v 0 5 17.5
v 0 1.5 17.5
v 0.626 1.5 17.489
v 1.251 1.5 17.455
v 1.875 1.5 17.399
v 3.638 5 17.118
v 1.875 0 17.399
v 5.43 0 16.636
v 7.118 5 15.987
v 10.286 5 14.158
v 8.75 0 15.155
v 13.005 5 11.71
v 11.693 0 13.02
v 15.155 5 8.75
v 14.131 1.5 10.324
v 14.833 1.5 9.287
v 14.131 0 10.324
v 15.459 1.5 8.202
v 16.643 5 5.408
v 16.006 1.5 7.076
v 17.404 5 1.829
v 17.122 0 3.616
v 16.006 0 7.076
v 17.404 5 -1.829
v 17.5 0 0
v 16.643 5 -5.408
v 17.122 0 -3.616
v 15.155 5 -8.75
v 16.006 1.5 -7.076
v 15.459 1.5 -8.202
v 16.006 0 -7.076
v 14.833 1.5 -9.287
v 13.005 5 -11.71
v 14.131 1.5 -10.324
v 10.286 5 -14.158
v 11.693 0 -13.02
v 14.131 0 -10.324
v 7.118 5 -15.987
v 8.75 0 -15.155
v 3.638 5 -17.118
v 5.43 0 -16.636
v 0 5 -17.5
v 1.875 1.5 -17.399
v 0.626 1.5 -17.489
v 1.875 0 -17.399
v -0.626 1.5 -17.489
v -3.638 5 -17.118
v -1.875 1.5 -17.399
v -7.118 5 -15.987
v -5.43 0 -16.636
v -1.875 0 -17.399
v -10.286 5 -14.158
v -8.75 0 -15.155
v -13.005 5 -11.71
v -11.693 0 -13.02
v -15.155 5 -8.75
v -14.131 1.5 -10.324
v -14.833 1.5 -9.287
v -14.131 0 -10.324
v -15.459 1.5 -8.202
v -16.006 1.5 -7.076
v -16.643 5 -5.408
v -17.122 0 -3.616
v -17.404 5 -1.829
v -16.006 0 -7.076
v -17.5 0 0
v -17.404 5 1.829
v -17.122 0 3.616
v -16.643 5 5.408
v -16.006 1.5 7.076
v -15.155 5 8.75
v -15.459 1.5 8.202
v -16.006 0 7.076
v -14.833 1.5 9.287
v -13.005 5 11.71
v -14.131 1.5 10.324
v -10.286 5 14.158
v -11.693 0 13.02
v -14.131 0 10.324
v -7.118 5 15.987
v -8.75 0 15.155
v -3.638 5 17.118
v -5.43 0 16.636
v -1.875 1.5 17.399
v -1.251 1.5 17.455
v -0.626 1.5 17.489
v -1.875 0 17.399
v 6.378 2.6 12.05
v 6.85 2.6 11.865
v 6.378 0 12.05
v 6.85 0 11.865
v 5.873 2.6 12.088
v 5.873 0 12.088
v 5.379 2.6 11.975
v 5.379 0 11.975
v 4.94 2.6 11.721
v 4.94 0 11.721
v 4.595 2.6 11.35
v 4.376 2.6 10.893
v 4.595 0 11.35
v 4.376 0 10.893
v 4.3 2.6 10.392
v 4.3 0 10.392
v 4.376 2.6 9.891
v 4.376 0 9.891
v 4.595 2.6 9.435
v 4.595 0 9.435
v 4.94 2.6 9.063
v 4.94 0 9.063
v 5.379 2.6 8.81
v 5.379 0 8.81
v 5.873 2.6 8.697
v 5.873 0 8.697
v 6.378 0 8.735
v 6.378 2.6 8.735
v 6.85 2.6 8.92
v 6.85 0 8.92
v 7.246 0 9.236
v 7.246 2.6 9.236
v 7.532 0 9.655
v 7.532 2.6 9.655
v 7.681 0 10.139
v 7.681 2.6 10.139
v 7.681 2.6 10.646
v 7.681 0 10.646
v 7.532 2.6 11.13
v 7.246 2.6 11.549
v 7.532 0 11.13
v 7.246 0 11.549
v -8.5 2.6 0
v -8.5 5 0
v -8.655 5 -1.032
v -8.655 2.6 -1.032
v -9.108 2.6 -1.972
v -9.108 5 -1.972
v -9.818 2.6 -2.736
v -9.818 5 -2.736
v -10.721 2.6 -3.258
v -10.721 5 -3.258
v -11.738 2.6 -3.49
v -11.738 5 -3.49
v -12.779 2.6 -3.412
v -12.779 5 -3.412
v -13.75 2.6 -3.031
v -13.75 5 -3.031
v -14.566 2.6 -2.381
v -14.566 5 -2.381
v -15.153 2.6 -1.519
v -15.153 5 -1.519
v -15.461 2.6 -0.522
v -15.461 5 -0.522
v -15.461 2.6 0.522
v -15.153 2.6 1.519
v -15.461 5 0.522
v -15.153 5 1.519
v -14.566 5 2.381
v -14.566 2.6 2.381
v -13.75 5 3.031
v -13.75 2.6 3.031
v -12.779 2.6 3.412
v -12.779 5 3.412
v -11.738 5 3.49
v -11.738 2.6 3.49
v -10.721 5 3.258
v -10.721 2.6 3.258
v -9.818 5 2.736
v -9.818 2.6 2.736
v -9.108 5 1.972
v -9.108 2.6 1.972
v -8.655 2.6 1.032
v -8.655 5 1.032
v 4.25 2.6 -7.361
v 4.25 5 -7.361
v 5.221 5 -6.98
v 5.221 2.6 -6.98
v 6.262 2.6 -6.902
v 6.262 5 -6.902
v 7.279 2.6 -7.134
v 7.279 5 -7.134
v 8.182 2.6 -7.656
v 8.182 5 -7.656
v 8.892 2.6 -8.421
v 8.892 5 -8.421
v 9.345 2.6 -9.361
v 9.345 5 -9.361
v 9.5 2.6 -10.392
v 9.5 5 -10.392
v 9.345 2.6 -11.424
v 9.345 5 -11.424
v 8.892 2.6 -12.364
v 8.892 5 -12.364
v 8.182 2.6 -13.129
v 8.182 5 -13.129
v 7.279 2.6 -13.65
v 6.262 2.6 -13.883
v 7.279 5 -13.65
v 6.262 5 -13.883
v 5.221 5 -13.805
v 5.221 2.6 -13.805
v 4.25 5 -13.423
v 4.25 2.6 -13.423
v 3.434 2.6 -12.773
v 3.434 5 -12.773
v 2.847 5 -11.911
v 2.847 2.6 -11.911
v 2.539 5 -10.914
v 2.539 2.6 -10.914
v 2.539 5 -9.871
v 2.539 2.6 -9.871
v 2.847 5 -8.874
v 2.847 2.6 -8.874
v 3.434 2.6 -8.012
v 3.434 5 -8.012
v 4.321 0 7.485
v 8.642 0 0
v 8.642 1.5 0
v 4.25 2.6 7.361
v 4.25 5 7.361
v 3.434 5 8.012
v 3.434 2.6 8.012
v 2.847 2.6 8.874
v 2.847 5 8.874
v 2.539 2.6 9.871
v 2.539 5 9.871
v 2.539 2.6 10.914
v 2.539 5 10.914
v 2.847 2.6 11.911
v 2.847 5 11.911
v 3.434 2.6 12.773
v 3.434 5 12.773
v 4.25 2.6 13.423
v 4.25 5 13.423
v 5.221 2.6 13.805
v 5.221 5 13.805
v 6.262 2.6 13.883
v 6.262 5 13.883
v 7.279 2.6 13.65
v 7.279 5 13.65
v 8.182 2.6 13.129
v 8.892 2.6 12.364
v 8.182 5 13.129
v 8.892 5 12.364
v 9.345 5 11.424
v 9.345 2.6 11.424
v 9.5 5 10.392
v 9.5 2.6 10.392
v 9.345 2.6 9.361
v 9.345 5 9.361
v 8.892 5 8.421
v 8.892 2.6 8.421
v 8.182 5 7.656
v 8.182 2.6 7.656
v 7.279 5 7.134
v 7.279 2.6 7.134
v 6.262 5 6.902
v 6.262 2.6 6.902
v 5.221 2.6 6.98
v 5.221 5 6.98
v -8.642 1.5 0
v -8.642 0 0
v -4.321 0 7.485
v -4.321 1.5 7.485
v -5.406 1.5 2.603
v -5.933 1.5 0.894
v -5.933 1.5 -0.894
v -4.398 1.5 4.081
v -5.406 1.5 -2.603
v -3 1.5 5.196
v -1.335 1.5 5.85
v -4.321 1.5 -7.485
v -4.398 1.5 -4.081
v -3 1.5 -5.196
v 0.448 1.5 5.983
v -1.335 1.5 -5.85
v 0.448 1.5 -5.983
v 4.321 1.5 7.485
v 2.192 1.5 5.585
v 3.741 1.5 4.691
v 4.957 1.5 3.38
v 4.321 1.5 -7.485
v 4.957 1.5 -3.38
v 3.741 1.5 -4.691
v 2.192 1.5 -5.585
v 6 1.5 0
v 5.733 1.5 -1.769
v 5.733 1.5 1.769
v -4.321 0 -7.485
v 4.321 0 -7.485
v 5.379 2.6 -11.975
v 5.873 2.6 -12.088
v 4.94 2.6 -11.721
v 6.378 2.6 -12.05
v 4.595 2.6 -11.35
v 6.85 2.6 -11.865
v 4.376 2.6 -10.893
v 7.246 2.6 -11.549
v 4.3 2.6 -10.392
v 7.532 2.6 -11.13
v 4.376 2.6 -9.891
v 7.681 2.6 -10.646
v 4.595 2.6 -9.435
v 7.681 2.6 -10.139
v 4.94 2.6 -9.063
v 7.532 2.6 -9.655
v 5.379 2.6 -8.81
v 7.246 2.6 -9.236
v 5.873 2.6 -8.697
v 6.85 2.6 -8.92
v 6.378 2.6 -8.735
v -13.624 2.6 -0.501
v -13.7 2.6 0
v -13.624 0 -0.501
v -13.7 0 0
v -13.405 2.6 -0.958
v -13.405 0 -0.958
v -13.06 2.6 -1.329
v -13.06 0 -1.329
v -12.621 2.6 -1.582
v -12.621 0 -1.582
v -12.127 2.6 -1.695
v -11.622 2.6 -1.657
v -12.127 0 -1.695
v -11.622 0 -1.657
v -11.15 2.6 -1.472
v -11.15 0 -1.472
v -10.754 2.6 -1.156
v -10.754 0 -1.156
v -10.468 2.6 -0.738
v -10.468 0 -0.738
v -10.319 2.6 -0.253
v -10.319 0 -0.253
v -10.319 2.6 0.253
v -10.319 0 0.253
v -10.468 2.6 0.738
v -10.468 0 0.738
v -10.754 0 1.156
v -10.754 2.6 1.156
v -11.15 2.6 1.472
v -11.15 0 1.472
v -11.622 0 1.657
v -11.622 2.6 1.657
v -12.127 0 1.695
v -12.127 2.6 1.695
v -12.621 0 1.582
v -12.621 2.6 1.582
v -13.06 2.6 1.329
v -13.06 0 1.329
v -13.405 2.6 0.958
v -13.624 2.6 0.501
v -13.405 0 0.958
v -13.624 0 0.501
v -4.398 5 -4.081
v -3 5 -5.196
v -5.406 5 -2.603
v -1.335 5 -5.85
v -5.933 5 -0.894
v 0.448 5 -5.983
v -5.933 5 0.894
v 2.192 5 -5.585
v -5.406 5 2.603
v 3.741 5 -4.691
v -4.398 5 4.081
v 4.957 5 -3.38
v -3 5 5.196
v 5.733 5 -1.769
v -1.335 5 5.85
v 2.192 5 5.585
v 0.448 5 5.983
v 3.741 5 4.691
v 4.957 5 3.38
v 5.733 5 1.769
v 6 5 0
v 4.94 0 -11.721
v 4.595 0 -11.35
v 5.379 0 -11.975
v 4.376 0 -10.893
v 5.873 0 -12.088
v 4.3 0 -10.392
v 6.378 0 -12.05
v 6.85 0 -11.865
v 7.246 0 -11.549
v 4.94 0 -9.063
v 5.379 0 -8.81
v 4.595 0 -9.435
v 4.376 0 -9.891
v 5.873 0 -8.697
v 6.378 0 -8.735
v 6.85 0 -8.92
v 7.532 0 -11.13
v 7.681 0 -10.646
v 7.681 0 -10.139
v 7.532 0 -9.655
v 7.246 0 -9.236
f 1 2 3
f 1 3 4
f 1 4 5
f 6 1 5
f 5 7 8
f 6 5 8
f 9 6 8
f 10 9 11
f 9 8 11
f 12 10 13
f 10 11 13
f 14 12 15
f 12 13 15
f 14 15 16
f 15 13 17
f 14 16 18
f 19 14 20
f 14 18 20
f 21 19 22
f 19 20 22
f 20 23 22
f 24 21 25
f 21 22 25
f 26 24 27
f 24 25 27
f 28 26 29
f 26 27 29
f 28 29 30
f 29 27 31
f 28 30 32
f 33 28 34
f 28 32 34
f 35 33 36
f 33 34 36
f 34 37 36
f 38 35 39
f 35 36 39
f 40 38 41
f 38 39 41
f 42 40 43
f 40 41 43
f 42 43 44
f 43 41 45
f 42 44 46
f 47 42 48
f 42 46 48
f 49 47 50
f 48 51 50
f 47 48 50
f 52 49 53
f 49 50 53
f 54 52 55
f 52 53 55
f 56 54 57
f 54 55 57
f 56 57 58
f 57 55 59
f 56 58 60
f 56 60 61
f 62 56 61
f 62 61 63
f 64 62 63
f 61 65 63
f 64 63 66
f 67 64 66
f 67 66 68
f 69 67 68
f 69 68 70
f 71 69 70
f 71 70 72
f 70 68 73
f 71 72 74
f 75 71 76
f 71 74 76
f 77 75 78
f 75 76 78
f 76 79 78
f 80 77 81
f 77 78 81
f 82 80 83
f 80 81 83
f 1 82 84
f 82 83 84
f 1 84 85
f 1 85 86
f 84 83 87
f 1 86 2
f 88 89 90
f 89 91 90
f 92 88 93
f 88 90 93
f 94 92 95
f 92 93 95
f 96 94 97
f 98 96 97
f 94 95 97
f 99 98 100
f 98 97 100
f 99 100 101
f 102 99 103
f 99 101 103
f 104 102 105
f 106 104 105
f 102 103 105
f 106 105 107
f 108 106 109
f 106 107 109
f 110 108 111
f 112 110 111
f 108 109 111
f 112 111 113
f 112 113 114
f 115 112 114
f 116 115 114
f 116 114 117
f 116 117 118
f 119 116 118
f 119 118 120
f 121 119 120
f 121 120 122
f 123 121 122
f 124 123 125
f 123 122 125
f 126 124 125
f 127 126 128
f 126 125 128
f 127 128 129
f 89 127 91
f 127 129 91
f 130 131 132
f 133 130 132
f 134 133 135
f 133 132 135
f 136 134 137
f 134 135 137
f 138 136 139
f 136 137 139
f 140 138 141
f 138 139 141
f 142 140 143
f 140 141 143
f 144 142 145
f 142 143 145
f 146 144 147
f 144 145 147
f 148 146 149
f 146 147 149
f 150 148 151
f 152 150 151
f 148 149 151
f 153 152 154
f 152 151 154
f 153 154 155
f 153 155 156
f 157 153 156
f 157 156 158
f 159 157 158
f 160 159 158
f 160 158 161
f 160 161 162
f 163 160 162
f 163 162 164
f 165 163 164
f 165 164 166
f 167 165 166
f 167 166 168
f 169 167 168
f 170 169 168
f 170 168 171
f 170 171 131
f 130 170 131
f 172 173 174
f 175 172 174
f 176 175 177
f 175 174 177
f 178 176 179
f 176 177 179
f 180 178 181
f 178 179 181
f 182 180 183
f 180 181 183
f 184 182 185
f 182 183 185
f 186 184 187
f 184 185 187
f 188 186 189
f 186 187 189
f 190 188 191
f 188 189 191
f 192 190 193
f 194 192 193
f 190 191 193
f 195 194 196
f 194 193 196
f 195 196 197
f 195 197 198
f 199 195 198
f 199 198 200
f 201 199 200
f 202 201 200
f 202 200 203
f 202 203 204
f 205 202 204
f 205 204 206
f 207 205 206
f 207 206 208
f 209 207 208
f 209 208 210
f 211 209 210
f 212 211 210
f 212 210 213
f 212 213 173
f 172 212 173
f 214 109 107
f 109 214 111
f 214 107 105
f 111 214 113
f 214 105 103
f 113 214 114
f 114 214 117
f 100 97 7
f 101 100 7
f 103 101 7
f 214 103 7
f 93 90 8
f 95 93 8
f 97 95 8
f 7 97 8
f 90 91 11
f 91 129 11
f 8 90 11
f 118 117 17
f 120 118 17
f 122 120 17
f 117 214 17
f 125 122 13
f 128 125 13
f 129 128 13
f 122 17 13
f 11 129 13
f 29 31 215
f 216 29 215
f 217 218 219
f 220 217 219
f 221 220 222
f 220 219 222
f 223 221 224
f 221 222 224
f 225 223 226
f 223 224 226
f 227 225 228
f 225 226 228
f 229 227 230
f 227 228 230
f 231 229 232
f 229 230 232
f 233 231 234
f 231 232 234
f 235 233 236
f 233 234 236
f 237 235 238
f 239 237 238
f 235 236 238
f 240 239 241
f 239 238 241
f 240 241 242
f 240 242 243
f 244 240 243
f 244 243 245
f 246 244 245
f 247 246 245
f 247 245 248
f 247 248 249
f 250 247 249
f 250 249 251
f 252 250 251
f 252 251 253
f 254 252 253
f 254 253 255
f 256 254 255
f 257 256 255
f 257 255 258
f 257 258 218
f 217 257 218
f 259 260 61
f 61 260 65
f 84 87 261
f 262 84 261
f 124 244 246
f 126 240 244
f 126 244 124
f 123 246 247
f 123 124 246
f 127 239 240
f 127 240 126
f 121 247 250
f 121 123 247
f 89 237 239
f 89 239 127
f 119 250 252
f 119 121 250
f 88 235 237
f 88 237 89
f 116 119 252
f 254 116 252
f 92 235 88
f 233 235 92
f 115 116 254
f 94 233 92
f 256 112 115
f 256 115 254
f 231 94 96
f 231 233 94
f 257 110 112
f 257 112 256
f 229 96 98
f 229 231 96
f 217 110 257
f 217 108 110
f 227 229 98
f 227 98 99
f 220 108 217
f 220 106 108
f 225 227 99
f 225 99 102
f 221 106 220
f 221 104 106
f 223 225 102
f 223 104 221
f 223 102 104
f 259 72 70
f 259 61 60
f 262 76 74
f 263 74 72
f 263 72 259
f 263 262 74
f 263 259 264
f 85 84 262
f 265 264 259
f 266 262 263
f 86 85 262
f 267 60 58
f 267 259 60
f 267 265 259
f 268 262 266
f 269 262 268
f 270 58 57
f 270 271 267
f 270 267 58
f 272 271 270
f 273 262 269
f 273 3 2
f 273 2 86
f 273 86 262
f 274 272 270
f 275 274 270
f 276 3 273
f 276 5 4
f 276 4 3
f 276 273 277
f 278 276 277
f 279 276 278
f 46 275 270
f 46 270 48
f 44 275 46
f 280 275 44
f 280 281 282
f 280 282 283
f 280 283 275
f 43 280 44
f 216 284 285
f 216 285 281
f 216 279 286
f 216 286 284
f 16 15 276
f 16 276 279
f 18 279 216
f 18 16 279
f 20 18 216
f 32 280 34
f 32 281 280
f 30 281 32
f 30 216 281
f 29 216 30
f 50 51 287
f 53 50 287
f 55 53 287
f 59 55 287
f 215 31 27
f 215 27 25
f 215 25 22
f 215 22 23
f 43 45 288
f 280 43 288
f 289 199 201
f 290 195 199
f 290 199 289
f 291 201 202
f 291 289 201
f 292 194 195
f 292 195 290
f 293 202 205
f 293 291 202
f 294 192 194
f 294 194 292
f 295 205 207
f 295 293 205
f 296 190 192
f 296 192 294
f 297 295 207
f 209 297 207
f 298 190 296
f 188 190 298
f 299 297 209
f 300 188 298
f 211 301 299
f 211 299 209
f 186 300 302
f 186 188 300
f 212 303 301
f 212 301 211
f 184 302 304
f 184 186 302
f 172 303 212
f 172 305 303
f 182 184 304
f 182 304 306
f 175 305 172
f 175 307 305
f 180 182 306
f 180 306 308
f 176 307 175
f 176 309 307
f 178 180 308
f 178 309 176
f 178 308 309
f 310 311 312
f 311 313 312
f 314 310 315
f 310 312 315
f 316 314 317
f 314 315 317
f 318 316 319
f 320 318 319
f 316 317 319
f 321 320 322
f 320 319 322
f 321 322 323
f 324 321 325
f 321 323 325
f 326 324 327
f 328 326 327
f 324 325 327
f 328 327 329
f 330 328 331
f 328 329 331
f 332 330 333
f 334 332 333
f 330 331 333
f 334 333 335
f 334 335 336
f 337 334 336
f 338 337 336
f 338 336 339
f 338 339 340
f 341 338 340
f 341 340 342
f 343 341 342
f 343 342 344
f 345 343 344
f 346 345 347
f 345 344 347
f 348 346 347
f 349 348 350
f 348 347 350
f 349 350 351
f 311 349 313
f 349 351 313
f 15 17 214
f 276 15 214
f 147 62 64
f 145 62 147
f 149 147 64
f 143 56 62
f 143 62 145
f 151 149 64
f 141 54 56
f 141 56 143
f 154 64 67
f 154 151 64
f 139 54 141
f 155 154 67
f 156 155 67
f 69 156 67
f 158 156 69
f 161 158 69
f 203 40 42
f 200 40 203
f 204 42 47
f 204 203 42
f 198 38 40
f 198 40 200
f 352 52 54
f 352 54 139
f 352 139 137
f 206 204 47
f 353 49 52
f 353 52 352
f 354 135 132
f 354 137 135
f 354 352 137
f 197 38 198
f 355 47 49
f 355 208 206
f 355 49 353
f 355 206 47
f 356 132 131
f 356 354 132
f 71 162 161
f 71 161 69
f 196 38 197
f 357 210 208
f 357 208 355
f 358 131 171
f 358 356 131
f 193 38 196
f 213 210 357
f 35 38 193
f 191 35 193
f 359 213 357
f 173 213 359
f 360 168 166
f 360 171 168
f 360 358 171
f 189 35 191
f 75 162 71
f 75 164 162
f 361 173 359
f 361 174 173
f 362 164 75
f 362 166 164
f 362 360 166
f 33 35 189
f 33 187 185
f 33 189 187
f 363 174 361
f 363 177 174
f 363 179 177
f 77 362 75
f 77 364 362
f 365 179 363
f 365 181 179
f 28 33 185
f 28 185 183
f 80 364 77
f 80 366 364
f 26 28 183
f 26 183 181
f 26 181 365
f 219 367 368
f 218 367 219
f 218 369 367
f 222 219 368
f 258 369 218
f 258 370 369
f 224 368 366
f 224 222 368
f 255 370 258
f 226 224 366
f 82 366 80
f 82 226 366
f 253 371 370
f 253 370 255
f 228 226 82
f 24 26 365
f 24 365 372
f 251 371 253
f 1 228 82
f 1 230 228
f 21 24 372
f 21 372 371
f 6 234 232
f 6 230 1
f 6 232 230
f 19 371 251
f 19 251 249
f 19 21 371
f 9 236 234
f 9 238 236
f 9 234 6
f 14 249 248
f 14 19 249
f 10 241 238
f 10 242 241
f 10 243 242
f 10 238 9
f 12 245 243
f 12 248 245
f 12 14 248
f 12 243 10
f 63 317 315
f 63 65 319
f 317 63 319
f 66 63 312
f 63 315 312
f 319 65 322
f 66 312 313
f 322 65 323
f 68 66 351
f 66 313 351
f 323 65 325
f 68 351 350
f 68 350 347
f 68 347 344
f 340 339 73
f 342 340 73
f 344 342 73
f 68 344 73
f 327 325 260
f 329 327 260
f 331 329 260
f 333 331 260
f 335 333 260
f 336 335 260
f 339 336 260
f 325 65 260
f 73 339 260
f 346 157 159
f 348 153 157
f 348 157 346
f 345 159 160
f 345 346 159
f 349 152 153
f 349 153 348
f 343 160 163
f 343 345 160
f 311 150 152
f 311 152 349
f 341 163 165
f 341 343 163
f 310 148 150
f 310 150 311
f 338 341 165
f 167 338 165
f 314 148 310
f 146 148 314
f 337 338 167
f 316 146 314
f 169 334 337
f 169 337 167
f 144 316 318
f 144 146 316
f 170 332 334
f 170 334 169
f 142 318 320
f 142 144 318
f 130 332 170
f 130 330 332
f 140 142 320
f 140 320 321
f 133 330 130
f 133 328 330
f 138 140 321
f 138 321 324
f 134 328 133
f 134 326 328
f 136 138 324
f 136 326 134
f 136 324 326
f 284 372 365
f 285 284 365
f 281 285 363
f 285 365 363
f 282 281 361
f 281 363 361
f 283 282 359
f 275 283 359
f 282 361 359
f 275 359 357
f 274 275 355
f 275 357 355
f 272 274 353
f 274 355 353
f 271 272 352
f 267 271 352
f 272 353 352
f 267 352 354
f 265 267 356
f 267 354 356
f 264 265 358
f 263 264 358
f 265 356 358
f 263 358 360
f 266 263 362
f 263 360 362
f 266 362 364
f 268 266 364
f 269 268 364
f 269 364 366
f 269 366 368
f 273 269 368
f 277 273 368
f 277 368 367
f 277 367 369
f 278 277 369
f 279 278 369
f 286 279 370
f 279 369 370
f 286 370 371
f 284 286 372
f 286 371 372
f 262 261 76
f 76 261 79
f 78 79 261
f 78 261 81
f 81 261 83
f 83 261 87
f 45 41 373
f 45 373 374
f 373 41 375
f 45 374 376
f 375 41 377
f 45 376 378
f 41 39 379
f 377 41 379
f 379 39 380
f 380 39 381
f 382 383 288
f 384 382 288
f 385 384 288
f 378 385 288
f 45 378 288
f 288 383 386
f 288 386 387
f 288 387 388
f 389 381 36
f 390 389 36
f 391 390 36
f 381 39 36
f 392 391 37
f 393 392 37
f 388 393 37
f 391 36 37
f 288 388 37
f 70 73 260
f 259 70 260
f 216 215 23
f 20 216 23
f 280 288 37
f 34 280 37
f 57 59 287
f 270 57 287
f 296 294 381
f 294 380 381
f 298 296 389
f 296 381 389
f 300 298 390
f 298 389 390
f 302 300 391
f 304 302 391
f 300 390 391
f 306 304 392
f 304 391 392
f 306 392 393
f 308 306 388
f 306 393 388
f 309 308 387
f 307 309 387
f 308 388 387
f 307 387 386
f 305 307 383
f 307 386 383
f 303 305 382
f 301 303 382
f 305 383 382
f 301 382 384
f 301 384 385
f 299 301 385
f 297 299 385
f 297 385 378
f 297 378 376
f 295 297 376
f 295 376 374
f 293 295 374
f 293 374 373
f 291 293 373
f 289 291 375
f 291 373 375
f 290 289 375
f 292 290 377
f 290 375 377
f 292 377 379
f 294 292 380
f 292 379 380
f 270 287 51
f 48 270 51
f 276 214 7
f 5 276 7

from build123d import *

# Parameters (mm, degrees)
SKETCH1_R                                = 17.5
BOSS_EXTRUDE1_DEPTH                      = 5
CBORE_FOR_M3_PAN_HEAD_SCREW1_D           = 3.4
CBORE_FOR_M3_PAN_HEAD_SCREW1_CBORE_D     = 7
CBORE_FOR_M3_PAN_HEAD_SCREW1_CBORE_DEPTH = 2.4
CIRPATTERN1_COUNT                        = 3
F_12_0_12_DIAMETER_HOLE1_D               = 12
CUT_EXTRUDE1_DEPTH                       = 1.5
CIRPATTERN2_COUNT                        = 6


with BuildPart() as part:
    # Sketch1 → Boss-Extrude1 (new body)
    with BuildSketch(Plane(origin=(0, 0, 0), x_dir=(1, 0, 0), z_dir=(0, 1, 0))):
        with Locations(Location((0, 0, 0), (0, 0, 270))):
            Circle(SKETCH1_R)
    extrude(amount=BOSS_EXTRUDE1_DEPTH)

    # CBORE for M3 Pan Head Screw1 (through all)
    with Locations(Plane(origin=(0, 5, 0), x_dir=(1, 0, 0), z_dir=(0, 1, 0))):
        with Locations((-12, 0)):
            cbore_for_m3_pan_head_screw1 = CounterBoreHole(CBORE_FOR_M3_PAN_HEAD_SCREW1_D / 2, CBORE_FOR_M3_PAN_HEAD_SCREW1_CBORE_D / 2, CBORE_FOR_M3_PAN_HEAD_SCREW1_CBORE_DEPTH)

    # CirPattern1: CBORE for M3 Pan Head Screw1 ×3 about axis
    cirpattern1_axis = Axis((0, 0, 0), (0, 1, 0))
    for i in range(1, CIRPATTERN1_COUNT):
        add(cbore_for_m3_pan_head_screw1.rotate(cirpattern1_axis, i * 360 / CIRPATTERN1_COUNT), mode=Mode.SUBTRACT)

    # Ø12.0 (12) Diameter Hole1 (through all)
    with Locations(Plane(origin=(0, 0, 0), x_dir=(-1, 0, 0), z_dir=(0, -1, 0))):
        with Locations((0, 0)):
            Hole(F_12_0_12_DIAMETER_HOLE1_D / 2)

    # Sketch7 → Cut-Extrude1 (cut)
    with BuildSketch(Plane.XZ):
        Polygon((0, 25), (-5.723634799, 1.800001303), (5.723634799, 1.800001303), align=None)
    cut_extrude1 = extrude(amount=-CUT_EXTRUDE1_DEPTH, mode=Mode.SUBTRACT)

    # CirPattern2: Cut-Extrude1 ×6 about axis
    cirpattern2_axis = Axis((0, 0, 0), (0, 1, 0))
    for i in range(1, CIRPATTERN2_COUNT):
        add(cut_extrude1.rotate(cirpattern2_axis, i * 360 / CIRPATTERN2_COUNT), mode=Mode.SUBTRACT)


solid = part.part
